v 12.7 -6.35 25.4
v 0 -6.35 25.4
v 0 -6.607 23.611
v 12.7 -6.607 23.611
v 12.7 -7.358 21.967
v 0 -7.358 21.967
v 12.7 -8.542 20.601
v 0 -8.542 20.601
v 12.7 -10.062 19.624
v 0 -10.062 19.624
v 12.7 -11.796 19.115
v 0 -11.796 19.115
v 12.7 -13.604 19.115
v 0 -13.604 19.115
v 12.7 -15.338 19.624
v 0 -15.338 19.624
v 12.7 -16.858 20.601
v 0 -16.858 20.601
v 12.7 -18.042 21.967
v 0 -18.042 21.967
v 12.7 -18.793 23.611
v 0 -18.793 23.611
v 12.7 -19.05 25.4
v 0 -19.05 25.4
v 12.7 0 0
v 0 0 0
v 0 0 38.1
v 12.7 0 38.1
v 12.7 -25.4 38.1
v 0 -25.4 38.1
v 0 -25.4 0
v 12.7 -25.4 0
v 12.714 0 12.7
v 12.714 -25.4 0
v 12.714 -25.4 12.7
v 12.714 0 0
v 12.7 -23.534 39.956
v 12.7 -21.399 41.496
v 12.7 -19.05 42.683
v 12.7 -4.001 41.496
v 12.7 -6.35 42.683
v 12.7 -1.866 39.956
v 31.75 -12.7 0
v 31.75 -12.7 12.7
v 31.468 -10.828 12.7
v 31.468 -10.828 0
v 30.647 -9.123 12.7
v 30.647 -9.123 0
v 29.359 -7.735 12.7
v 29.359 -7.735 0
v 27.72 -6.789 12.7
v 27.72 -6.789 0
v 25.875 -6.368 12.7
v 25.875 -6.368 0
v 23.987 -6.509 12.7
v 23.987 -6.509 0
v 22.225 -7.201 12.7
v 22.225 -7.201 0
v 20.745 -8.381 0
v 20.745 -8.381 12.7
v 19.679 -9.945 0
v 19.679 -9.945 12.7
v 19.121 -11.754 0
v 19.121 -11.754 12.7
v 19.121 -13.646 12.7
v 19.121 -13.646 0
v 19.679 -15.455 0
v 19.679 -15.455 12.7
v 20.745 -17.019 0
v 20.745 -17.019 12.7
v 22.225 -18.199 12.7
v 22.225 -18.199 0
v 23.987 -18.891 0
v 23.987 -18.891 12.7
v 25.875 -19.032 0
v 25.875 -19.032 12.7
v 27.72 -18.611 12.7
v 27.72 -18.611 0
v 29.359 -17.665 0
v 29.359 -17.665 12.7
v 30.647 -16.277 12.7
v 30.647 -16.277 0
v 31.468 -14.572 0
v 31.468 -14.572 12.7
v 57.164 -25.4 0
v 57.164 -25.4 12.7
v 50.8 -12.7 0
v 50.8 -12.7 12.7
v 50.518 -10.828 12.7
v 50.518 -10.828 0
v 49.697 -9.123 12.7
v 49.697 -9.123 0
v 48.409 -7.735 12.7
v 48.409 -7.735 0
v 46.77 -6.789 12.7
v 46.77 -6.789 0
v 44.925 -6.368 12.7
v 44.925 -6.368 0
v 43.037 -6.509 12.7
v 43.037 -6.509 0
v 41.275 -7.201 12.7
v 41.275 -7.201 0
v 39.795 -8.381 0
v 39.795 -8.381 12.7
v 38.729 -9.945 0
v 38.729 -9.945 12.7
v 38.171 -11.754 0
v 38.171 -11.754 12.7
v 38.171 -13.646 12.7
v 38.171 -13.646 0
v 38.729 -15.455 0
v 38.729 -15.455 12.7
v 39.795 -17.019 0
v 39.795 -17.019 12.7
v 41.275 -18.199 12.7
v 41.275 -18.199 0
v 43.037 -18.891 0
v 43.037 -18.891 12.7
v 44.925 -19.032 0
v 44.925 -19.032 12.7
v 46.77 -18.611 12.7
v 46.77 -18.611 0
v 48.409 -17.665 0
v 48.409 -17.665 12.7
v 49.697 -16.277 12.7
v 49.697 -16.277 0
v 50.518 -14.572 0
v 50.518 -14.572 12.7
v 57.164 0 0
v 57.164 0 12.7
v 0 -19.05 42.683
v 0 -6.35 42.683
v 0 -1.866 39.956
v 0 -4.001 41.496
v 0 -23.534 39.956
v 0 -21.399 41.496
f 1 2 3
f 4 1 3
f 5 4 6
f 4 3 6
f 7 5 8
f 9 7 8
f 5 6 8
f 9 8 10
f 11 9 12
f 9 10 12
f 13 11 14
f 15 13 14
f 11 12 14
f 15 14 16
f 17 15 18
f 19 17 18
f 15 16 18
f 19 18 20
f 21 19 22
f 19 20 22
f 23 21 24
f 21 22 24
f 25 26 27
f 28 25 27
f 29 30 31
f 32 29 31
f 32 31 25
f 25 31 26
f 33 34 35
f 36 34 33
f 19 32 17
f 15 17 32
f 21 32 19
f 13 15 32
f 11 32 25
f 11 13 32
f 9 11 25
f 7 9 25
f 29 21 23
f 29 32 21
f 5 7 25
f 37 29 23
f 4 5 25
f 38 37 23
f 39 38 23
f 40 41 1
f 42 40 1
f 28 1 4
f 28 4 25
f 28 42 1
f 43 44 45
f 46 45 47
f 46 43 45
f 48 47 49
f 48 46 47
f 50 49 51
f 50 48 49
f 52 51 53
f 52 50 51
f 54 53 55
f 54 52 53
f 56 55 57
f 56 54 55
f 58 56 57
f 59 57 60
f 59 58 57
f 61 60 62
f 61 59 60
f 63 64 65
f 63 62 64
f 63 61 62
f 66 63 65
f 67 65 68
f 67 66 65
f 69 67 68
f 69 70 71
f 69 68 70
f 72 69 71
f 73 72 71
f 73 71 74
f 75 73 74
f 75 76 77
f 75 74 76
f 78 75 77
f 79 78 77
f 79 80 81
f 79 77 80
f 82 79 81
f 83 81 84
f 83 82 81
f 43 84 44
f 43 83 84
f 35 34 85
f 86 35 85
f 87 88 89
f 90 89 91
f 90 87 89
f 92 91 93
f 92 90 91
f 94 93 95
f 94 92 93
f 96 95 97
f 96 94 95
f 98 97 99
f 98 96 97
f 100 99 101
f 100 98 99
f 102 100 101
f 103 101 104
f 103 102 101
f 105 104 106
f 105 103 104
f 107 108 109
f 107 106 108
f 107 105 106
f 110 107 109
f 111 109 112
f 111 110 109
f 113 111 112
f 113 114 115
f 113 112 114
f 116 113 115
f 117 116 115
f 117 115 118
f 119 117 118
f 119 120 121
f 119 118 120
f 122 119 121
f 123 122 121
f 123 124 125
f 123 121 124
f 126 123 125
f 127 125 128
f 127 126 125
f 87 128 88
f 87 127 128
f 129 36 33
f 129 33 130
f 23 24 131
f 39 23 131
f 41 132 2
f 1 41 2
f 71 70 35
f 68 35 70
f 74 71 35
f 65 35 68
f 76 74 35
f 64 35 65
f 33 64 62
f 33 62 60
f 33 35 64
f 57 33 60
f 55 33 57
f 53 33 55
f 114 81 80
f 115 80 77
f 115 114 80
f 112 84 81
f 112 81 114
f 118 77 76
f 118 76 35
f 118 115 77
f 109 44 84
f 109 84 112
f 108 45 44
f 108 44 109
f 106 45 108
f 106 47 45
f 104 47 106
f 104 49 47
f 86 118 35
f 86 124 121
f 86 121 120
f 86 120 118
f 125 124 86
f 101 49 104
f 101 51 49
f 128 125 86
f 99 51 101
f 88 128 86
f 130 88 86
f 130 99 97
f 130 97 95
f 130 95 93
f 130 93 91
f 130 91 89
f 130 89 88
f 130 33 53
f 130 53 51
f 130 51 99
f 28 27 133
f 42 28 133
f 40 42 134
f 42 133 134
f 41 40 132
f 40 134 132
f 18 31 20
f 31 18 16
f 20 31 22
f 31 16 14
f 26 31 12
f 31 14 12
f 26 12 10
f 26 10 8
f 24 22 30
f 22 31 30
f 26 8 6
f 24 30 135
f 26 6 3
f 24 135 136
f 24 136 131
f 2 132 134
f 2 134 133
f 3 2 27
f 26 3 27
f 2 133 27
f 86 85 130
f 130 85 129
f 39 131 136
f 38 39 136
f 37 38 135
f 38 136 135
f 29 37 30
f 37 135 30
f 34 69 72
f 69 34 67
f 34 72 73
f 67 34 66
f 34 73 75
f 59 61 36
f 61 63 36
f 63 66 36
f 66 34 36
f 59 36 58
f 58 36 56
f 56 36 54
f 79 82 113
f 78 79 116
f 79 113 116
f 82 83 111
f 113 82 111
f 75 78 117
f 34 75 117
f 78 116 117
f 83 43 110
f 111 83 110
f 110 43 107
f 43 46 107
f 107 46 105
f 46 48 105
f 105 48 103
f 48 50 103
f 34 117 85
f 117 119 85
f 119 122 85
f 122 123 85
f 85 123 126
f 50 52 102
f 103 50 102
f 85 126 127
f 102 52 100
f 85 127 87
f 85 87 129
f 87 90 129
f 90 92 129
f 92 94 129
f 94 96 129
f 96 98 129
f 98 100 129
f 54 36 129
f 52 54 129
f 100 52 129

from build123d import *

# Parameters (mm, degrees)
F1_DEPTH = 12.7
F2_W     = 44.45
F2_H     = 25.4
F3_DEPTH = 12.7
F4_R     = 6.35
F5_DEPTH = 25.4
F7_DEPTH = 12.7


with BuildPart() as f1:
    # F0 (on Right) → F1 (new body)
    with BuildSketch(Plane.YZ):
        with BuildLine():
            Line((-25.4, 0), (0, 0))
            Line((0, 0), (0, 44.45))
            Line((0, 44.45), (-6.35, 44.45))
            Line((-6.35, 44.45), (-6.35, 25.4))
            ThreePointArc((-6.35, 25.4), (-12.7, 19.05), (-19.05, 25.4))
            Line((-19.05, 25.4), (-19.05, 44.45))
            Line((-19.05, 44.45), (-25.4, 44.45))
            Line((-25.4, 44.45), (-25.4, 0))
        make_face()
    extrude(amount=F1_DEPTH)

    # F6 (on face) → F7 (cut)
    with BuildSketch(Plane(origin=(0, 0, 0), x_dir=(0, -1, 0), z_dir=(-1, 0, 0))):
        with BuildLine():
            ThreePointArc((0, 38.1), (2.903281, 40.767818), (6.35, 42.682609))
            Line((6.35, 42.682609), (6.35, 44.45))
            Line((6.35, 44.45), (0, 44.45))
            Line((0, 44.45), (0, 38.1))
        make_face()
        with BuildLine():
            ThreePointArc((19.05, 42.682609), (22.496719, 40.767818), (25.4, 38.1))
            Line((25.4, 38.1), (25.4, 44.45))
            Line((25.4, 44.45), (19.05, 44.45))
            Line((19.05, 44.45), (19.05, 42.682609))
        make_face()
    extrude(amount=-F7_DEPTH, mode=Mode.SUBTRACT)


with BuildPart() as f3:
    # F2 (on Top) → F3 (new body)
    with BuildSketch(Plane.XY):
        with Locations((34.939058, -12.7)):
            Rectangle(F2_W, F2_H)
    extrude(amount=F3_DEPTH)

    # F4 (on Top) → F5 (cut)
    with BuildSketch(Plane.XY):
        with Locations((25.4, -12.7)):
            Circle(F4_R)
        with Locations((44.45, -12.7)):
            Circle(F4_R)
    extrude(amount=F5_DEPTH, mode=Mode.SUBTRACT)


solid = Compound([f1.part, f3.part])
